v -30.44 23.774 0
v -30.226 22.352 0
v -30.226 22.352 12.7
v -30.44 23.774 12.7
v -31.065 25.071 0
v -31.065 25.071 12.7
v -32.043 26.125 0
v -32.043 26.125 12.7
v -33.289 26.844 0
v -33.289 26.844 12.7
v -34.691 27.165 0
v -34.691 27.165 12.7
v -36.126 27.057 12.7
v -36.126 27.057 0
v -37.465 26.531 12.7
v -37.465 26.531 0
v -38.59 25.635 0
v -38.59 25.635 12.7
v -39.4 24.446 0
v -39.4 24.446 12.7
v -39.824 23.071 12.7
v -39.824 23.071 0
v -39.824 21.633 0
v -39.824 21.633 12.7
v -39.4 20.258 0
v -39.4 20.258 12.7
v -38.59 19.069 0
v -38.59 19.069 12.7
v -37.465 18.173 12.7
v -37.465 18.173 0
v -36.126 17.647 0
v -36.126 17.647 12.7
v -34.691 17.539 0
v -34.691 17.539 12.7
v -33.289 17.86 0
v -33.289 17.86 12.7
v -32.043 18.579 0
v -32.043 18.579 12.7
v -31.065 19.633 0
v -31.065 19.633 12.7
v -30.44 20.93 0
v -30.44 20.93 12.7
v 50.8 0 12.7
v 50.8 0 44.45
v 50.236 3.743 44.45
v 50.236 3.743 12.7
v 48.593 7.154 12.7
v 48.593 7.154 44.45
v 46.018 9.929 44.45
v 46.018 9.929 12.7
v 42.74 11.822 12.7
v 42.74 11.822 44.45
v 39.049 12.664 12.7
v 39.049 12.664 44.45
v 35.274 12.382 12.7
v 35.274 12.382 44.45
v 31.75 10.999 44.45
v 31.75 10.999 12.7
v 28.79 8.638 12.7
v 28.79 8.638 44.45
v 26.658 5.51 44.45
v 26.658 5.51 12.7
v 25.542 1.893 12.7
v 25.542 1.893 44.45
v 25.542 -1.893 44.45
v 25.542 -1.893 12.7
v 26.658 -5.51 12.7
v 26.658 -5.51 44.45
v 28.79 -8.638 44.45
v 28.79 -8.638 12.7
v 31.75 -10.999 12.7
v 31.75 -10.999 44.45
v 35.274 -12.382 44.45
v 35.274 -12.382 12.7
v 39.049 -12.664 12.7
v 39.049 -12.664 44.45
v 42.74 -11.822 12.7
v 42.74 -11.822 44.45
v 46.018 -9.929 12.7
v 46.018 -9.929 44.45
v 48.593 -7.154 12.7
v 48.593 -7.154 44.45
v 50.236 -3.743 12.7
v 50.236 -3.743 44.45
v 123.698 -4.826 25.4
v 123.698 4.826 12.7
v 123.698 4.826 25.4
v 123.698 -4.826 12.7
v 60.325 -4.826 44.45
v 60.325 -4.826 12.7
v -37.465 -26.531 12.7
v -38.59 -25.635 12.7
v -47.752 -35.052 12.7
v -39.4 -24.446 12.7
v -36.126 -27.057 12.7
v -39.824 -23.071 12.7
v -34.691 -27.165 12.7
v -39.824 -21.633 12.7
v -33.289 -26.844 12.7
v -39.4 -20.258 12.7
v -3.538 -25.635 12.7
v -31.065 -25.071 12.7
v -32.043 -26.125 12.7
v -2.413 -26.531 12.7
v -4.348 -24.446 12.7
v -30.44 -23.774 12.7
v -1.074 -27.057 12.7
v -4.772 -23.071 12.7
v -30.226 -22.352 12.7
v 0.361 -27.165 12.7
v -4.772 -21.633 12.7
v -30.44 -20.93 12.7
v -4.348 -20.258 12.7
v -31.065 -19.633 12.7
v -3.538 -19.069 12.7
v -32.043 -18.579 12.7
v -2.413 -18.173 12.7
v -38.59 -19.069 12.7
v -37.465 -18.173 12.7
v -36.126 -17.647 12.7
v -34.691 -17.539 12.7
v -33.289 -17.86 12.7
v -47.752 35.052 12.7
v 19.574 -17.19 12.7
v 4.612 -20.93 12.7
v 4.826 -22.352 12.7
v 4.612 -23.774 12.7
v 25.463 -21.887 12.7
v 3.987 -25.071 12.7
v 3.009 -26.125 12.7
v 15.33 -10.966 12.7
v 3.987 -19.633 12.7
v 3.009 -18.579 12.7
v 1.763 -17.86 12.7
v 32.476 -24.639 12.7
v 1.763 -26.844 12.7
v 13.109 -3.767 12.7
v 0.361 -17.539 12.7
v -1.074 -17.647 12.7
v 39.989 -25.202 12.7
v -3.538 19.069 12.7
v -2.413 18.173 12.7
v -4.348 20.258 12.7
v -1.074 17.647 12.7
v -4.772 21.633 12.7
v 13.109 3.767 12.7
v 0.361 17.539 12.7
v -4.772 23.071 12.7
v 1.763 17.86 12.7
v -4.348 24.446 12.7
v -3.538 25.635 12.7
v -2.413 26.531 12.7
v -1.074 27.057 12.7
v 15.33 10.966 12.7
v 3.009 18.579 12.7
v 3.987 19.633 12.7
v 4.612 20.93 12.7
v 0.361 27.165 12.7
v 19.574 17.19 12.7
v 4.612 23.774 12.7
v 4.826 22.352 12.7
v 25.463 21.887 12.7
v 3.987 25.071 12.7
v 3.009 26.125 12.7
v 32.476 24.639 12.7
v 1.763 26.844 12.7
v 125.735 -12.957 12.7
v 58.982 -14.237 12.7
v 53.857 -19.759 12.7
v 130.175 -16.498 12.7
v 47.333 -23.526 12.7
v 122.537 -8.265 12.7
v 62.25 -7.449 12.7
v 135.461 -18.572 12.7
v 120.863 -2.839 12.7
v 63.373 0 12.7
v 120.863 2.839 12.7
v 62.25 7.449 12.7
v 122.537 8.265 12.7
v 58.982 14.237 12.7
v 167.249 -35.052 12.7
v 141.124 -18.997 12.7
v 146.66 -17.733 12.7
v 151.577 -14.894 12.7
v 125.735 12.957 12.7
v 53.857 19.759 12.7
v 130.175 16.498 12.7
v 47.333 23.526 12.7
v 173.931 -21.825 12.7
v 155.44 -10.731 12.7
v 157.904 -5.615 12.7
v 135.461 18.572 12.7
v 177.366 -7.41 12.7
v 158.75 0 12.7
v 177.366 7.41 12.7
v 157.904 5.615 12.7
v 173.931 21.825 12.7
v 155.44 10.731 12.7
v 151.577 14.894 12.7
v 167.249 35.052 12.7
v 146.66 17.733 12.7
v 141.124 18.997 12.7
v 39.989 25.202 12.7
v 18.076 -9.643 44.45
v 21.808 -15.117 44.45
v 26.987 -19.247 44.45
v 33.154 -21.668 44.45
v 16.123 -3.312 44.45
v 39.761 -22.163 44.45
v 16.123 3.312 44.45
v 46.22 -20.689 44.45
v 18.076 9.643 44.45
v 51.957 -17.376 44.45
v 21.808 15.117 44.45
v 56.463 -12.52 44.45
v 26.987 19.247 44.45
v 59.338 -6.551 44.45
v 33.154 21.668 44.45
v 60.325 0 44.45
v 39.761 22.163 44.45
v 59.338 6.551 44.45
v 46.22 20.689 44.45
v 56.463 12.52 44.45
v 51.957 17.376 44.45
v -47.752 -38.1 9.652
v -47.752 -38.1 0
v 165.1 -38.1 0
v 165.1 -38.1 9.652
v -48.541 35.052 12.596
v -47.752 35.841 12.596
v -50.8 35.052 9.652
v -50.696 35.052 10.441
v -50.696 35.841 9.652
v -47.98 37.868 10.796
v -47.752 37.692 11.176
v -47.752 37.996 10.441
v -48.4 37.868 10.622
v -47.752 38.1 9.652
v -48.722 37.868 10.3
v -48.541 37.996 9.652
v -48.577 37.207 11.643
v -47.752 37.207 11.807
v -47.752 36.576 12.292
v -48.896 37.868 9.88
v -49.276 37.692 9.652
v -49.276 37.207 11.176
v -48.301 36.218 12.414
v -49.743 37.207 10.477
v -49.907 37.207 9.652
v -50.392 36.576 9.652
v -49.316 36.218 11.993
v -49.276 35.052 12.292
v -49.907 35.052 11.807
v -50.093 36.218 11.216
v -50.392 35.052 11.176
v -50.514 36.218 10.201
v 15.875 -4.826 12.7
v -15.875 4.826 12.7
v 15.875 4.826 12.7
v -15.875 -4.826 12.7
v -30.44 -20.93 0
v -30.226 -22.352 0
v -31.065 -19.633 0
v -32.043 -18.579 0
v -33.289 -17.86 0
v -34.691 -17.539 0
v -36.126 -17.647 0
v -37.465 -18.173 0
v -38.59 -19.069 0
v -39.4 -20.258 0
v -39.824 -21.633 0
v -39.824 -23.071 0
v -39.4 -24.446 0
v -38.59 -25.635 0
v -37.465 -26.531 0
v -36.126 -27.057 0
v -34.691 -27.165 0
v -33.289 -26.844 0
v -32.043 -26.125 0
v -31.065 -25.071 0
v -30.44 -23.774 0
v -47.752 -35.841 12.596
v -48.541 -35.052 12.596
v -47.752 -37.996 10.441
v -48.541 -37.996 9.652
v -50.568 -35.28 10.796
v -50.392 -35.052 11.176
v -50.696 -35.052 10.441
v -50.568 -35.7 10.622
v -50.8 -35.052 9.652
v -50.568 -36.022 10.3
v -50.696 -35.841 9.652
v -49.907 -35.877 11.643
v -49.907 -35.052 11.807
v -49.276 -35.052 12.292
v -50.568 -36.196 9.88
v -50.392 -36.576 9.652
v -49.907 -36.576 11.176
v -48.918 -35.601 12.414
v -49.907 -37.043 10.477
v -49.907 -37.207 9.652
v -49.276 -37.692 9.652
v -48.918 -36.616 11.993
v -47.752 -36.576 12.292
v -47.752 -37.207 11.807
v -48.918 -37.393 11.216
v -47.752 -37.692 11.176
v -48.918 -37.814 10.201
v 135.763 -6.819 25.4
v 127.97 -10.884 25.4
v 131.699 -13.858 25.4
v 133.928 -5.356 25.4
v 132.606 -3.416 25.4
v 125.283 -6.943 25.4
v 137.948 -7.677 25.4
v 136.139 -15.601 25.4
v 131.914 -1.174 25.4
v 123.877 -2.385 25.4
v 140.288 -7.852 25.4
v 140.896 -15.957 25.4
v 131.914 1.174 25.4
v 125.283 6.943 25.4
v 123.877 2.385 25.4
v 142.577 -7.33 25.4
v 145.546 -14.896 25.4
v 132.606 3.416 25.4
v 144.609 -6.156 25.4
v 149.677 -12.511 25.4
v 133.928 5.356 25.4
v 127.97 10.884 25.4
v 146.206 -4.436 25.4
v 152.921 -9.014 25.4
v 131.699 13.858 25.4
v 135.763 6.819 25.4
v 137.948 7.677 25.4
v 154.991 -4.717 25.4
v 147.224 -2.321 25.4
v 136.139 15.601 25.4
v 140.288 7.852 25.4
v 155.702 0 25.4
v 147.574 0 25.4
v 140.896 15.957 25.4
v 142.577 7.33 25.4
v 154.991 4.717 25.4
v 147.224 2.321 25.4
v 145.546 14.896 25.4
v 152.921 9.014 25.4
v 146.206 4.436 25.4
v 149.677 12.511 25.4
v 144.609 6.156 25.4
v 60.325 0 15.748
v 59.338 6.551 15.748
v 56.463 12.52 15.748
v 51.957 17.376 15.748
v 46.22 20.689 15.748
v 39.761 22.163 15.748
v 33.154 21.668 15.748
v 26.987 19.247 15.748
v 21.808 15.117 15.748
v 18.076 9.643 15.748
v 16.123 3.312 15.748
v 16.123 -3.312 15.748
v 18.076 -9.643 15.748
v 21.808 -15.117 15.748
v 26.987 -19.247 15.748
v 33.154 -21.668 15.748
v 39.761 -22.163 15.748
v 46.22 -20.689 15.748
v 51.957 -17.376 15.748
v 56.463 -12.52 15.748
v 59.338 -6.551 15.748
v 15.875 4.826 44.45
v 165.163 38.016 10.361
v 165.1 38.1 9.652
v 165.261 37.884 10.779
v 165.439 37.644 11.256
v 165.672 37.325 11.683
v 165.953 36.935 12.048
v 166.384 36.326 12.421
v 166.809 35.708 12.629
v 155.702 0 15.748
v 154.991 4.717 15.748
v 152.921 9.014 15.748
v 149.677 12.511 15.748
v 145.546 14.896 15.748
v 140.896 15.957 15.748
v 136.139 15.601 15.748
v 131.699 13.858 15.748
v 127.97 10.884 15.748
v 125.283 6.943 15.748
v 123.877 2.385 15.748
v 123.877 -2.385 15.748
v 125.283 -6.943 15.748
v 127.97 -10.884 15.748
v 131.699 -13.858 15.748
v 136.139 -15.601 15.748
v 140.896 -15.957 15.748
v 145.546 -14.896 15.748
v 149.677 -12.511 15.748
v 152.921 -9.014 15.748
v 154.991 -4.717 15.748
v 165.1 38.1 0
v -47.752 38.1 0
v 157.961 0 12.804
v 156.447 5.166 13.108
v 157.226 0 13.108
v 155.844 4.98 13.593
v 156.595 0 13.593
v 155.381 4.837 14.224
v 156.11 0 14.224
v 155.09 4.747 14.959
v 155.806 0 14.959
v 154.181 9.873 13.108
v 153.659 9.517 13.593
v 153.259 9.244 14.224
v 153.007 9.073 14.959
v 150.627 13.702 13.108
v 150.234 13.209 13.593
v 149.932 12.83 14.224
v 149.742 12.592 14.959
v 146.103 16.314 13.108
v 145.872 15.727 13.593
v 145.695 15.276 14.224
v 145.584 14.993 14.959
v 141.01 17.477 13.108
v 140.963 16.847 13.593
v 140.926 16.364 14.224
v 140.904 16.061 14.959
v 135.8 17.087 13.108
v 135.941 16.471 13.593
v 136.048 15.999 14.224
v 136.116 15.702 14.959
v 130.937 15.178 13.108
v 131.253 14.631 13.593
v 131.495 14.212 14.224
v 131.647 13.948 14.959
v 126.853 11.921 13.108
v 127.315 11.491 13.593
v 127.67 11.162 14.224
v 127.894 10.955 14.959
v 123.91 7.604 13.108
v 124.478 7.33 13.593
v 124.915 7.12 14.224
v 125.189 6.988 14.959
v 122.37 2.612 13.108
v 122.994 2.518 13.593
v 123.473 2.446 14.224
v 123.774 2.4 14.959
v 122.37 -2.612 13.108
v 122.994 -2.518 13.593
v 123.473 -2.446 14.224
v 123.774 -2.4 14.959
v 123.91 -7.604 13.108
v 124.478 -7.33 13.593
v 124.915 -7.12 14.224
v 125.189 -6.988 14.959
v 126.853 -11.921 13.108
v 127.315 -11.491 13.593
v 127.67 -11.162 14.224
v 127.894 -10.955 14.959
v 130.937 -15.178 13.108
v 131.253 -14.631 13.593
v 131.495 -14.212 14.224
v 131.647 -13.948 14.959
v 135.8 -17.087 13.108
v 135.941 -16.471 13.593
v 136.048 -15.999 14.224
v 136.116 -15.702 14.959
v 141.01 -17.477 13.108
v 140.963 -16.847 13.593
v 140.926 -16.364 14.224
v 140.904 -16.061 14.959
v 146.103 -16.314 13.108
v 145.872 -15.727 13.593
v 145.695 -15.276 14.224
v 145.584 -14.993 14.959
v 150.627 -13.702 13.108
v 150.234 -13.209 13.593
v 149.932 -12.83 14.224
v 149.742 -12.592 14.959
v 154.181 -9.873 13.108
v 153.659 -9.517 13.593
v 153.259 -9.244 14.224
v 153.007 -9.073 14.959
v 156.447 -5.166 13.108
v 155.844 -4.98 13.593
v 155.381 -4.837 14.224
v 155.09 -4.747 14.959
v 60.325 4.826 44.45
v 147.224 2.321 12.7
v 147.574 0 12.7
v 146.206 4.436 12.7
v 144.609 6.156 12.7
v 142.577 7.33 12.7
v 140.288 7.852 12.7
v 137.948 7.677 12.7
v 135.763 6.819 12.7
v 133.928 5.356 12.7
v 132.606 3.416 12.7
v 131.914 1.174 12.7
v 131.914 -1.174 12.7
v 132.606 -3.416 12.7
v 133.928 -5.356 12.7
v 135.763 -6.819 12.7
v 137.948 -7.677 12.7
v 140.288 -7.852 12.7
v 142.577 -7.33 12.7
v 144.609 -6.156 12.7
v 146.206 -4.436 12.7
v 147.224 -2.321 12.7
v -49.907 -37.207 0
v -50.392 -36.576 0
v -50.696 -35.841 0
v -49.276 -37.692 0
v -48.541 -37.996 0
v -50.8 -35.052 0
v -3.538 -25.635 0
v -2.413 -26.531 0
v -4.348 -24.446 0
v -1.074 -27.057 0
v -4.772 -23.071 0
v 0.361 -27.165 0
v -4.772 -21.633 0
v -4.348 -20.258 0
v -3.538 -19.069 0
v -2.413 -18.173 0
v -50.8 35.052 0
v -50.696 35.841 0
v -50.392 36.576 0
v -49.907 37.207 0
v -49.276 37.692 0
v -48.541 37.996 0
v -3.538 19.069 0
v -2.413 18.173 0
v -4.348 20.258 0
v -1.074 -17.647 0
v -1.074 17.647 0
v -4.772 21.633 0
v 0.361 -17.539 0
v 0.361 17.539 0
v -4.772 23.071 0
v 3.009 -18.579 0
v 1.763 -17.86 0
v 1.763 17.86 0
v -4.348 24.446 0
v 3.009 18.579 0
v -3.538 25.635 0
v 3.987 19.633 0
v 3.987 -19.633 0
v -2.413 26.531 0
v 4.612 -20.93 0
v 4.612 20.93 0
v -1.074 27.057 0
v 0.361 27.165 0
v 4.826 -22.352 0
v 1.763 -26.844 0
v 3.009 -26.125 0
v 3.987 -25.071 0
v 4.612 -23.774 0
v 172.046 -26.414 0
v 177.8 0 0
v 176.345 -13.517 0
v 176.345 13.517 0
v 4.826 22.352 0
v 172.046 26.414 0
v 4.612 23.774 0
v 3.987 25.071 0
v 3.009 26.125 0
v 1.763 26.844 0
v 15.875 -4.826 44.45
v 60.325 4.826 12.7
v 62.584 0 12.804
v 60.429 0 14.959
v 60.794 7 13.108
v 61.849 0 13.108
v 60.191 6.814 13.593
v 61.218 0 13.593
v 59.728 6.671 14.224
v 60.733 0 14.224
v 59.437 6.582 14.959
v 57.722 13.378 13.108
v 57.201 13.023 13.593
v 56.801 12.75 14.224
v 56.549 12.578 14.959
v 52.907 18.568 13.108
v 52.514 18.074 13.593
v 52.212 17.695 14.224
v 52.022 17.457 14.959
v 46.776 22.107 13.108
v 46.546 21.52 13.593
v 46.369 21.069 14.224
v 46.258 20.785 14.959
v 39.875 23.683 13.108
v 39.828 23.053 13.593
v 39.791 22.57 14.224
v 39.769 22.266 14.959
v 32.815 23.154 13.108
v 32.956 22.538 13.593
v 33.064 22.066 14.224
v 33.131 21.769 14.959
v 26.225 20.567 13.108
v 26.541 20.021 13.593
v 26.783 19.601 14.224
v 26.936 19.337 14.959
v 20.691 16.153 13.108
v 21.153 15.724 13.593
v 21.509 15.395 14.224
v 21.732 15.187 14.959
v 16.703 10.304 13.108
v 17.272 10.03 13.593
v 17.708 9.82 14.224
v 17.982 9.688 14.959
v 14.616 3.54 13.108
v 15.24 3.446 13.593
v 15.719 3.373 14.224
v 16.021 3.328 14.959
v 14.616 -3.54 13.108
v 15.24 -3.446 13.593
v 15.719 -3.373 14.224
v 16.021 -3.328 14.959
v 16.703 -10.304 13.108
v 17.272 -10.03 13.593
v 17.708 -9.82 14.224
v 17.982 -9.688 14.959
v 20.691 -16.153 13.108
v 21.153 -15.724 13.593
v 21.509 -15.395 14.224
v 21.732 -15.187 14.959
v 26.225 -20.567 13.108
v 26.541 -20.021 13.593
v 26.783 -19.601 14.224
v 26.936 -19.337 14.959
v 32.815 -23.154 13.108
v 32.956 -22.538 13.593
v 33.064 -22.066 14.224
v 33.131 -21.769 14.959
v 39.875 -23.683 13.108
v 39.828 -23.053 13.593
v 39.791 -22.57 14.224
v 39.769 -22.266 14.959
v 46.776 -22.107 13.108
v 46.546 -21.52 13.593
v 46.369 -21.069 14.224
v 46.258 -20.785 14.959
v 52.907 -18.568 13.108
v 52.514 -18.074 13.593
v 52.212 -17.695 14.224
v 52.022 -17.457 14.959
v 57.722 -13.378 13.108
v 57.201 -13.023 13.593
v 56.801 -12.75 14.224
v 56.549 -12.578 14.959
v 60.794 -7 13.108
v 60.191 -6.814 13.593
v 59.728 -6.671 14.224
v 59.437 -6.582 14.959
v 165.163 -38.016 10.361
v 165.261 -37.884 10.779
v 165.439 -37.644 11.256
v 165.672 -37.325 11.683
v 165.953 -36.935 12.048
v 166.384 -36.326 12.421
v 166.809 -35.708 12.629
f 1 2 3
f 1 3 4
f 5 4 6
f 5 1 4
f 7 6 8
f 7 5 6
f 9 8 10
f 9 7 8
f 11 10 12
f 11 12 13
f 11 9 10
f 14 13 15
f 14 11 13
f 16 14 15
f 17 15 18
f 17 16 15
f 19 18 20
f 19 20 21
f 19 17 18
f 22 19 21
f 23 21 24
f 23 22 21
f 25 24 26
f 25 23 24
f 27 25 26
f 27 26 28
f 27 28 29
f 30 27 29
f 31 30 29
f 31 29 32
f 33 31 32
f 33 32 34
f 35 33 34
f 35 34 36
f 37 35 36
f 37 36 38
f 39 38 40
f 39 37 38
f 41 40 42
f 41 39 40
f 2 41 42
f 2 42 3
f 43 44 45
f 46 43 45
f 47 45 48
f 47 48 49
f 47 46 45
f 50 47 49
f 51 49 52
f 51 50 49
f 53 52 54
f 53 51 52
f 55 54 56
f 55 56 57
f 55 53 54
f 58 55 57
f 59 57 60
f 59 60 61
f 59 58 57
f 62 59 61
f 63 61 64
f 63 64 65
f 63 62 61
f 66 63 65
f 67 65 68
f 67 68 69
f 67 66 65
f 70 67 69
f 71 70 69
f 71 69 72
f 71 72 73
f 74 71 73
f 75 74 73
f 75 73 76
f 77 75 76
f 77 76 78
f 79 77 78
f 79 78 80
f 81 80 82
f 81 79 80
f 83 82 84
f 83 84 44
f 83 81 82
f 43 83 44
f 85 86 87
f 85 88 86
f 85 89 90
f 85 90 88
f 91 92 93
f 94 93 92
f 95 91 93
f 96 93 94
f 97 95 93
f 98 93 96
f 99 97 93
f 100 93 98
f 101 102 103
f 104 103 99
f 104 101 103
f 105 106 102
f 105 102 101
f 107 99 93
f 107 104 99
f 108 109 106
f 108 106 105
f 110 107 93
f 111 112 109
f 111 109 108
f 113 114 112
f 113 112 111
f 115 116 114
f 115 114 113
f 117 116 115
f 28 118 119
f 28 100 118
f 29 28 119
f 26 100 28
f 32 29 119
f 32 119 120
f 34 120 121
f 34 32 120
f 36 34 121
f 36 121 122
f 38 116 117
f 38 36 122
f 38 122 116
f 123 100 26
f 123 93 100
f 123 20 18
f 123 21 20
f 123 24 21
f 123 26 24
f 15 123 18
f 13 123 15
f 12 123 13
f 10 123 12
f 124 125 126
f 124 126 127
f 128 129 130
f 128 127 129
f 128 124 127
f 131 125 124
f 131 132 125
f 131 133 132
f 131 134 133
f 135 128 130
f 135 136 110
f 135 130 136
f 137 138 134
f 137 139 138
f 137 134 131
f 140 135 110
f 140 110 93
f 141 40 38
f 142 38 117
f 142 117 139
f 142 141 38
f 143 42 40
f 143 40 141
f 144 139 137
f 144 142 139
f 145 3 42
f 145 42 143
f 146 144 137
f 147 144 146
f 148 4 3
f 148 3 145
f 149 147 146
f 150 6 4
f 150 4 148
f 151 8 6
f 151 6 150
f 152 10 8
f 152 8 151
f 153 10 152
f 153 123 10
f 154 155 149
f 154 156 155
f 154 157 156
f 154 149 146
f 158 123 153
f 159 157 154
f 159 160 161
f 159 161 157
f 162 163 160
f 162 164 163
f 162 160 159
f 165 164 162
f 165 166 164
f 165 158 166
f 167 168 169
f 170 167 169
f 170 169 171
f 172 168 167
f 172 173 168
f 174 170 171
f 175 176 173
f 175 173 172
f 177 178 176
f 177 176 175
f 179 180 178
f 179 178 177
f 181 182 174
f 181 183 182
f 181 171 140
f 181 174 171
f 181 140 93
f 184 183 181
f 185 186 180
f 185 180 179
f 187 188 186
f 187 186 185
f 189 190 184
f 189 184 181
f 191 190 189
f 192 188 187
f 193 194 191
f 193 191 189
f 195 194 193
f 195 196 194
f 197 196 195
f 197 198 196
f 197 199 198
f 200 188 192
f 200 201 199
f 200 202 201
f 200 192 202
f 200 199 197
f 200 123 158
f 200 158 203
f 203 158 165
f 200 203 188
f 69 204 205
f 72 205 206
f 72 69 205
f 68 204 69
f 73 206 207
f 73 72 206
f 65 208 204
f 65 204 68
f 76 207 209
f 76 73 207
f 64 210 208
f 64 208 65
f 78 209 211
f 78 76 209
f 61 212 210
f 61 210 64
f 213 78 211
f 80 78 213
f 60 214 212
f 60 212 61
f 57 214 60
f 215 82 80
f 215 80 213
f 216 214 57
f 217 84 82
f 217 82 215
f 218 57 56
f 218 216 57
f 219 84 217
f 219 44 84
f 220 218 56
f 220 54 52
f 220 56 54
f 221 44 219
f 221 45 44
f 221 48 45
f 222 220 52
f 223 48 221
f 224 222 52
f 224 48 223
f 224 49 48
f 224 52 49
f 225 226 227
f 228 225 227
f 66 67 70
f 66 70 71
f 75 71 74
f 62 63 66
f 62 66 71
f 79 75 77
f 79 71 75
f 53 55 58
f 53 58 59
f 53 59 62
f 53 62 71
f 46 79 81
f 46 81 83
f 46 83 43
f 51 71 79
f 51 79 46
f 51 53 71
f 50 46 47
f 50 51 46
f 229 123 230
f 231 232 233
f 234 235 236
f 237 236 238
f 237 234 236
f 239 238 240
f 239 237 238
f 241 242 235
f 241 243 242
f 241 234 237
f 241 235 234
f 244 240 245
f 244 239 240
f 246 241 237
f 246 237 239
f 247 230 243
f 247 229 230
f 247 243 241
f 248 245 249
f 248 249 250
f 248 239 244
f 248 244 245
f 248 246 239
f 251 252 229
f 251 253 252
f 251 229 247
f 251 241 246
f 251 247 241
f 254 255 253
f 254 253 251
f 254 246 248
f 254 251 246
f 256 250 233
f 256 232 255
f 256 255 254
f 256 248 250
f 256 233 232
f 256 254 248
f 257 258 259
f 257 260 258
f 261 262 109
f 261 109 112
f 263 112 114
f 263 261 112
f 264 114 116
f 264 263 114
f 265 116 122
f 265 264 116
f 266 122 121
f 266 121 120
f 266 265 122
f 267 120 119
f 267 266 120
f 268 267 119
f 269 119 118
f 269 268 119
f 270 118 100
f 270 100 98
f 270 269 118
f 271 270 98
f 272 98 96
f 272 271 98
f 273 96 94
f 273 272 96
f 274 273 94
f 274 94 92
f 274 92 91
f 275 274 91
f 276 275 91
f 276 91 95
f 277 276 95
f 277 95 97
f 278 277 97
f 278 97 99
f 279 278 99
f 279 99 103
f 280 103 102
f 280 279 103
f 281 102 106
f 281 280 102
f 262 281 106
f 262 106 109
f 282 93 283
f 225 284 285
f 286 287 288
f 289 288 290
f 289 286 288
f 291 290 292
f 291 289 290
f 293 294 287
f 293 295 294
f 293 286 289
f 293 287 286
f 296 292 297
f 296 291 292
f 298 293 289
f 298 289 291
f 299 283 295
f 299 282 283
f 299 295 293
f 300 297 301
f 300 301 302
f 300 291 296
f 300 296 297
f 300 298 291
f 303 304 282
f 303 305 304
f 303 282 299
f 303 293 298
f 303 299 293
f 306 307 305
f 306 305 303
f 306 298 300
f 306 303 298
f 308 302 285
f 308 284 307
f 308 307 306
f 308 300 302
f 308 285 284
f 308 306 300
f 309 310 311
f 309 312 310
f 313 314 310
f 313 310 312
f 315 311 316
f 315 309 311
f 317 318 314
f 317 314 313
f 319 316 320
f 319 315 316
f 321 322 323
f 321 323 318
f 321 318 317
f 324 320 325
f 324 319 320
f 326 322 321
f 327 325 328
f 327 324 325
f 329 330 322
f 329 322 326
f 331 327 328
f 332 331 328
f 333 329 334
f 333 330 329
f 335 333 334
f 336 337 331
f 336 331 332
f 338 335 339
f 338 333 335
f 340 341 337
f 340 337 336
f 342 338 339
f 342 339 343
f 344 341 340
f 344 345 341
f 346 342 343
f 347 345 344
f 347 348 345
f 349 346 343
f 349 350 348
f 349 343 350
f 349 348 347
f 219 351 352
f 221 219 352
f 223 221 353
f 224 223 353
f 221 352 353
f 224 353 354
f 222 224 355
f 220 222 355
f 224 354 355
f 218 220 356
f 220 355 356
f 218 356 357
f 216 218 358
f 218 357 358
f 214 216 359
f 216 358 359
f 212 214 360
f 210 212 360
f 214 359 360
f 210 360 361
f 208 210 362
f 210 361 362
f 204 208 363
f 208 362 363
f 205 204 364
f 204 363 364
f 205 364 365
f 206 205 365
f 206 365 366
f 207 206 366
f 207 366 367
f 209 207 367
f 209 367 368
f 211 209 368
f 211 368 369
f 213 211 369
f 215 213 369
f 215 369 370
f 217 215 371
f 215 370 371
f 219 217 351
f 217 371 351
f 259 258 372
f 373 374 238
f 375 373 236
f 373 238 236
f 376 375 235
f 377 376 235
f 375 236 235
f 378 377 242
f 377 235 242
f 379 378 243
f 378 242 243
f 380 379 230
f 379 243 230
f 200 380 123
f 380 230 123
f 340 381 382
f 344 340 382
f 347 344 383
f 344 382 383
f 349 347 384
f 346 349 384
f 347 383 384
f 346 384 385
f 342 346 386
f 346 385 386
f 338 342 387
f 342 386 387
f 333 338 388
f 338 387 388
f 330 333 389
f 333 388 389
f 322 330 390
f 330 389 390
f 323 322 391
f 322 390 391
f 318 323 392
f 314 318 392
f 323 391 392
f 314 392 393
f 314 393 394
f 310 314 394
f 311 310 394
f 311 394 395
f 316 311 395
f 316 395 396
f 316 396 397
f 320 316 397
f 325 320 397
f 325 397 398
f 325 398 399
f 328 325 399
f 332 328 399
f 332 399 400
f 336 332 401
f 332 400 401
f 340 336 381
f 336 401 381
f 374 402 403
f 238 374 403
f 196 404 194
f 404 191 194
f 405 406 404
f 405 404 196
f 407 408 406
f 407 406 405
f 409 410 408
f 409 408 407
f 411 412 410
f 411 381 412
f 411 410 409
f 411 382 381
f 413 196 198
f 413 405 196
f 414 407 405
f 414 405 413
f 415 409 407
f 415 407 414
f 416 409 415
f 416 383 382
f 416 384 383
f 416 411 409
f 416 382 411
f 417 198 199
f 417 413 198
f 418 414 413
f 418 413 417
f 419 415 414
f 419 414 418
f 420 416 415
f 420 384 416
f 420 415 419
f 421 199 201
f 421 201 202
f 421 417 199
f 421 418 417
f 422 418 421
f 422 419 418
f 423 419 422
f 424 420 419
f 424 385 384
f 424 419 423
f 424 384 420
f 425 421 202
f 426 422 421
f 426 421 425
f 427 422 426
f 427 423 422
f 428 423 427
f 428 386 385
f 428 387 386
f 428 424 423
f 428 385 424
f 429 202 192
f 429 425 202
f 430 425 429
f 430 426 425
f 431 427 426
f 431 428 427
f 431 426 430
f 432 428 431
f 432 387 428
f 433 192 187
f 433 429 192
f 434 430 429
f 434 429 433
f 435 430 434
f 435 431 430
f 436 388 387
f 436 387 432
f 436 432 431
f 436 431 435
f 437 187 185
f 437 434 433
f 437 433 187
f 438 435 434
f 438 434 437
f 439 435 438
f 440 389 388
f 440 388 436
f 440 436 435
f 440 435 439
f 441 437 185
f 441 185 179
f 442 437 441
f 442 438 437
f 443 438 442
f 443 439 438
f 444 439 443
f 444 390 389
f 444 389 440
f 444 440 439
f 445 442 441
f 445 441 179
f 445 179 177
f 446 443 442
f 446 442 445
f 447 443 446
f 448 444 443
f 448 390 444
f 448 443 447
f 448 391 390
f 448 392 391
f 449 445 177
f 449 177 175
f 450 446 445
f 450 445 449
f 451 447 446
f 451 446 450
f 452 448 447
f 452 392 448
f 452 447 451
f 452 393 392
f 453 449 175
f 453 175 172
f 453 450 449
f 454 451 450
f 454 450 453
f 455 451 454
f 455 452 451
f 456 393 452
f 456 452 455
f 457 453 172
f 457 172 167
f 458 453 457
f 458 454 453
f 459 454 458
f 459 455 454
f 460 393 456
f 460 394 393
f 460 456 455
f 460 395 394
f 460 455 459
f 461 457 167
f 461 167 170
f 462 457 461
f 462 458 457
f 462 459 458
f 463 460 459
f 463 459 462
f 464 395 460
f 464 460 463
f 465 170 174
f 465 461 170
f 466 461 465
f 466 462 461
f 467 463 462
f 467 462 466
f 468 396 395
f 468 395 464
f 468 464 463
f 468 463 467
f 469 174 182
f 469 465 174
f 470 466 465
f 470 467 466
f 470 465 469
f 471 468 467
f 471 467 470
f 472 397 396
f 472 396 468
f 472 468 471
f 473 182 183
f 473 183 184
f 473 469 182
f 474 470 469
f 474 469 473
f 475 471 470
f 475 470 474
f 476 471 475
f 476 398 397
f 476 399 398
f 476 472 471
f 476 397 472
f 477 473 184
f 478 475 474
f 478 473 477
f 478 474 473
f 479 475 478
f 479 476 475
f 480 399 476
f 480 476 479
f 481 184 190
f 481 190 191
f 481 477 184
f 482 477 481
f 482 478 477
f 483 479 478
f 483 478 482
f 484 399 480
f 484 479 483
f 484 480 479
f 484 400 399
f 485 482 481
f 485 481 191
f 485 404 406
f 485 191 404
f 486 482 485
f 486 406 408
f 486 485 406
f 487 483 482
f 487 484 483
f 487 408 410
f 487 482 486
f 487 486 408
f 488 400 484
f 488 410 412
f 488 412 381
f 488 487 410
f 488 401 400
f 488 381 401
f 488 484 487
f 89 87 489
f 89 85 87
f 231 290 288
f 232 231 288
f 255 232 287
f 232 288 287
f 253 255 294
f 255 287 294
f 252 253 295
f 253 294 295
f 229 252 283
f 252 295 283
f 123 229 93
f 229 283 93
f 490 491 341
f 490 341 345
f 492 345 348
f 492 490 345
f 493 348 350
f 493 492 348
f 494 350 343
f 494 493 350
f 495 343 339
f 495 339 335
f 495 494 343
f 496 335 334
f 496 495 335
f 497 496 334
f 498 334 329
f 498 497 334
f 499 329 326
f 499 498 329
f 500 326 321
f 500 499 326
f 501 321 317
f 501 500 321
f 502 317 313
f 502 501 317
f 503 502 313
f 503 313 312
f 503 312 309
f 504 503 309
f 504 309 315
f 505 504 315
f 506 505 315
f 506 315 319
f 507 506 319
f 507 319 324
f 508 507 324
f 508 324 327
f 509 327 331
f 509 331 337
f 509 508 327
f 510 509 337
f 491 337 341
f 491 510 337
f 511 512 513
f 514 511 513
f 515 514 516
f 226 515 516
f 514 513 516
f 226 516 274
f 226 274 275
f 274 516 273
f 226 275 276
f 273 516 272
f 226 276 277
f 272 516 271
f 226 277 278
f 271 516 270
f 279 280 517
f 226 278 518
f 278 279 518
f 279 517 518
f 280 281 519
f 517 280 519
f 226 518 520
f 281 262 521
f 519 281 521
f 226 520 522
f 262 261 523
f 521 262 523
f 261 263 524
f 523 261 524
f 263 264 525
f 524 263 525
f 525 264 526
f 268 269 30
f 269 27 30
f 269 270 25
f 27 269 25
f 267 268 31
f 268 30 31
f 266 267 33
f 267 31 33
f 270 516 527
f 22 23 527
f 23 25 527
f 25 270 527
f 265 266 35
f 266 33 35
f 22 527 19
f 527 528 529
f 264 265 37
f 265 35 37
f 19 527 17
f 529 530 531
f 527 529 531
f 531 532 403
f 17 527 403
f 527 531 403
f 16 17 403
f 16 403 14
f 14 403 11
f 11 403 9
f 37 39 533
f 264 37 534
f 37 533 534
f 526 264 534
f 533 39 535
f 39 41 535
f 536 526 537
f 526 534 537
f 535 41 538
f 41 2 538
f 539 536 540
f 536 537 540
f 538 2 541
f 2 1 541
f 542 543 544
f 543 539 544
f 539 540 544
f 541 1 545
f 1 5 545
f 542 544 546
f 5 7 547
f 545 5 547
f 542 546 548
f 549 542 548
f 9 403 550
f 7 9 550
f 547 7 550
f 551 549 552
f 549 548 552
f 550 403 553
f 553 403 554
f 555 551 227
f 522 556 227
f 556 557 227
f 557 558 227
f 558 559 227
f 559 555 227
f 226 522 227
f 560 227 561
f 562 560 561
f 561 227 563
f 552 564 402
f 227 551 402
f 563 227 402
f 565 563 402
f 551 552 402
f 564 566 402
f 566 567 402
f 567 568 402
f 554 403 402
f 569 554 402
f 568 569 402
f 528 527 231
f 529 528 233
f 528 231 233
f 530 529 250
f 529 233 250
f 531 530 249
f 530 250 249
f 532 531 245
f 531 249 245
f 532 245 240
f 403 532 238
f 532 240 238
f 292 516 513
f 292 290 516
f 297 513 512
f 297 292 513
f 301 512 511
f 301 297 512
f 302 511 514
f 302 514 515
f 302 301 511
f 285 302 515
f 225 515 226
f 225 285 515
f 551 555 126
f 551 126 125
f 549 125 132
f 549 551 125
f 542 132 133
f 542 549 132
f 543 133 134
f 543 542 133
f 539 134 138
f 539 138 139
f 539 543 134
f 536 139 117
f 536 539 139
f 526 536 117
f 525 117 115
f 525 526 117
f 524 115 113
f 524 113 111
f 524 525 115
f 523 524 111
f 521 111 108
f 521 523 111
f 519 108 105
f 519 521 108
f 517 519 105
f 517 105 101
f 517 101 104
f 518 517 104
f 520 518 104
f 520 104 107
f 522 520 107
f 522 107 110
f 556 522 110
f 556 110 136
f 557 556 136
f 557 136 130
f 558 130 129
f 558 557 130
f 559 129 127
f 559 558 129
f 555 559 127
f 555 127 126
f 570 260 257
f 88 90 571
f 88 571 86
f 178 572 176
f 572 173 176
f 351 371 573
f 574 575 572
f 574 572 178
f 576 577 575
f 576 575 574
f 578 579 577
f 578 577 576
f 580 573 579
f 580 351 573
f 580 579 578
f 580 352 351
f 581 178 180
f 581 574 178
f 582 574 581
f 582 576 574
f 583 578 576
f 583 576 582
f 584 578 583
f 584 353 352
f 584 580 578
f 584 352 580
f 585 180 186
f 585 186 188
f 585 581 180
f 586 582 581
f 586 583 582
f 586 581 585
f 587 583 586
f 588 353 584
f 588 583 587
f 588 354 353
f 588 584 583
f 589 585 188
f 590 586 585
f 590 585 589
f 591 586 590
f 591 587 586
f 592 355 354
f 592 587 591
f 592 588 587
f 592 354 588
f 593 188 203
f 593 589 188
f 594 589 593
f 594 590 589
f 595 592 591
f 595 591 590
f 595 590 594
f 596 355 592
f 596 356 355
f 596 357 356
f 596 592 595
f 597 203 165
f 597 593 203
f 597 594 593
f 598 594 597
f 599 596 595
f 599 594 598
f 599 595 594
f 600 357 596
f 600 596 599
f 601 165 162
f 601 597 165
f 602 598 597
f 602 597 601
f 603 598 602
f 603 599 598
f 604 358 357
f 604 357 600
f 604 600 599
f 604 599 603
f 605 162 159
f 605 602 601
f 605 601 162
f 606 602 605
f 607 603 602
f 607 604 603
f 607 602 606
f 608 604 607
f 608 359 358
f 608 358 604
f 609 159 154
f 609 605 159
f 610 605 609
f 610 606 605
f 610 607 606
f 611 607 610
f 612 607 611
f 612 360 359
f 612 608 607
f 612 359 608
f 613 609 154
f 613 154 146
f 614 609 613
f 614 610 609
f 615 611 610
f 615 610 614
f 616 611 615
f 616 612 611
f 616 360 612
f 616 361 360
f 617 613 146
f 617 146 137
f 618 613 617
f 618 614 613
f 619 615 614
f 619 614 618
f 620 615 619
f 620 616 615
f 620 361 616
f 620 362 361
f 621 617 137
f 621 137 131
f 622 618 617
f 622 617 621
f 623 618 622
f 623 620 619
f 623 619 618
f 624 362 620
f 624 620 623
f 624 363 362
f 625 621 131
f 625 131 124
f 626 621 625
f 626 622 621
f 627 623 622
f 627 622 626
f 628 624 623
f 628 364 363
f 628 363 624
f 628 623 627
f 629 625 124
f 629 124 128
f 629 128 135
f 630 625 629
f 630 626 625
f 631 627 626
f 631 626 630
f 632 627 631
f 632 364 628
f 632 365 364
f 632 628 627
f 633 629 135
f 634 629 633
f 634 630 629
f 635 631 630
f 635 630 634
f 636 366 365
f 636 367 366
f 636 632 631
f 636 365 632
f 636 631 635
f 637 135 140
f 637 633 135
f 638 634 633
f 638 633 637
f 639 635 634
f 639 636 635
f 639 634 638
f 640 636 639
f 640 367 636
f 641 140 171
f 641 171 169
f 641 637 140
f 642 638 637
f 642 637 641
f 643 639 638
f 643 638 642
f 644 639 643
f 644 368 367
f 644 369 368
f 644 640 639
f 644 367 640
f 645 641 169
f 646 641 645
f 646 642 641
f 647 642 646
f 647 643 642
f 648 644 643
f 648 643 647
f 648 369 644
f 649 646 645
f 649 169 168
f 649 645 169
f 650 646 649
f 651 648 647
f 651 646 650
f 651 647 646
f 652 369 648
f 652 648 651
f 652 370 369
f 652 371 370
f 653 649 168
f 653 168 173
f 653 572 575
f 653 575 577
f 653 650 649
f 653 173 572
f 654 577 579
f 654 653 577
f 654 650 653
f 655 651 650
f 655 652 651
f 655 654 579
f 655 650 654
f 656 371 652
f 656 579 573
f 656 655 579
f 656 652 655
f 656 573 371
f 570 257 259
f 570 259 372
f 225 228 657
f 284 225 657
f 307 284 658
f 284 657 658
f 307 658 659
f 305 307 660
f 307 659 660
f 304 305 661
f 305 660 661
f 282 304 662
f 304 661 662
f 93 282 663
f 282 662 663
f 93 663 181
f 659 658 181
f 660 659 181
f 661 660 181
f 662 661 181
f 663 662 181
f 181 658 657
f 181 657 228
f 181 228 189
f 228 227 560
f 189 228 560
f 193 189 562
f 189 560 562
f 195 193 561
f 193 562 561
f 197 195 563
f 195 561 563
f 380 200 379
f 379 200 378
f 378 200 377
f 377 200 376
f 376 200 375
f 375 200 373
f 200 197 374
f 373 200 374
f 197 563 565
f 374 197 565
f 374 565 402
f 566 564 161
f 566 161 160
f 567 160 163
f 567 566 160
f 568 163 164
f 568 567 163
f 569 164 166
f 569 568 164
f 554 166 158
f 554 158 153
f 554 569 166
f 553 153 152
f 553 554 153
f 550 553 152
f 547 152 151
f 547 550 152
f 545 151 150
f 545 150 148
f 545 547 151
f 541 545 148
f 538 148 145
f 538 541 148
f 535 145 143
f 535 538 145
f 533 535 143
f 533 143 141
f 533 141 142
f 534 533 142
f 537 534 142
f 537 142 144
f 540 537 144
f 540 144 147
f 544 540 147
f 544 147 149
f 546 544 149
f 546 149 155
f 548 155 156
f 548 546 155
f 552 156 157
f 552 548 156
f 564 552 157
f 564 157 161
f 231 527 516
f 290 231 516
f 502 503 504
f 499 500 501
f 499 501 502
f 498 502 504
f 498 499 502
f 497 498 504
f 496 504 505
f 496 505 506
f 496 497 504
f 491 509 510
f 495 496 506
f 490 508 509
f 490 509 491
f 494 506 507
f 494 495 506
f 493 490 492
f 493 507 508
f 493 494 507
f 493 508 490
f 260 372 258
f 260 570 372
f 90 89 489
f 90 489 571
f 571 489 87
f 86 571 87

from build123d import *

# Parameters (mm, degrees)
F0_R     = 4.826
F1_DEPTH = 12.7
F2_R     = 22.225
F2_R_2   = 12.7
F3_DEPTH = 31.75
F4_R     = 16.002
F4_R_2   = 7.874
F5_DEPTH = 12.7
F7_DEPTH = 4.826
F8_R     = 3.048


with BuildPart() as f1:
    # F0 (on Top) → F1 (new body)
    with BuildSketch(Plane.XY):
        with BuildLine():
            Line((139.7, 38.1), (-50.8, 38.1))
            Line((-50.8, 38.1), (-50.8, 0))
            Line((-50.8, 0), (-50.8, -38.1))
            Line((-50.8, -38.1), (139.7, -38.1))
            Line((139.7, -38.1), (165.1, -38.1))
            ThreePointArc((165.1, -38.1), (177.8, 0), (165.1, 38.1))
            Line((165.1, 38.1), (139.7, 38.1))
        make_face()
        with Locations((-35.052, -22.352)):
            Circle(F0_R, mode=Mode.SUBTRACT)
        with Locations((0, -22.352)):
            Circle(F0_R, mode=Mode.SUBTRACT)
        with Locations((-35.052, 22.352)):
            Circle(F0_R, mode=Mode.SUBTRACT)
        with Locations((0, 22.352)):
            Circle(F0_R, mode=Mode.SUBTRACT)
    extrude(amount=F1_DEPTH)

    # F2 (on face) → F3 (join)
    with BuildSketch(Plane.XY.offset(12.7)):
        with Locations((38.1, 0)):
            Circle(F2_R)
        with Locations((38.1, 0)):
            Circle(F2_R_2, mode=Mode.SUBTRACT)
    extrude(amount=F3_DEPTH)

    # F4 (on face) → F5 (join)
    with BuildSketch(Plane.XY.offset(12.7)):
        with Locations((139.7, 0)):
            Circle(F4_R)
        with Locations((139.7, 0)):
            Circle(F4_R_2, mode=Mode.SUBTRACT)
    extrude(amount=F5_DEPTH)

    # F8
    f8_edges = [f1.edges().sort_by_distance(p)[0] for p in [
        (57.15, -38.1, 12.7),
        (-50.8, 0, 12.7),
        (57.15, 38.1, 12.7),
        (-50.8, -38.1, 6.35),
        (-50.8, 38.1, 6.35),
        (123.698, 0, 12.7),
        (15.875, 0, 12.7),
    ]]
    fillet(f8_edges, radius=F8_R)


with BuildPart() as f7:
    # F6 (on Front) → F7 (new body, symmetric)
    with BuildSketch(Plane.XZ):
        Polygon((-15.875, 12.7), (15.875, 12.7), (15.875, 44.45), align=None)
    extrude(amount=F7_DEPTH, both=True)


with BuildPart() as f7b:
    # F6 (on Front) → F7, piece 2 (new body, symmetric)
    with BuildSketch(Plane.XZ):
        Polygon((123.698, 25.4), (60.325, 44.45), (60.325, 12.7), (123.698, 12.7), align=None)
    extrude(amount=F7_DEPTH, both=True)


solid = Compound([f1.part, f7.part, f7b.part])
